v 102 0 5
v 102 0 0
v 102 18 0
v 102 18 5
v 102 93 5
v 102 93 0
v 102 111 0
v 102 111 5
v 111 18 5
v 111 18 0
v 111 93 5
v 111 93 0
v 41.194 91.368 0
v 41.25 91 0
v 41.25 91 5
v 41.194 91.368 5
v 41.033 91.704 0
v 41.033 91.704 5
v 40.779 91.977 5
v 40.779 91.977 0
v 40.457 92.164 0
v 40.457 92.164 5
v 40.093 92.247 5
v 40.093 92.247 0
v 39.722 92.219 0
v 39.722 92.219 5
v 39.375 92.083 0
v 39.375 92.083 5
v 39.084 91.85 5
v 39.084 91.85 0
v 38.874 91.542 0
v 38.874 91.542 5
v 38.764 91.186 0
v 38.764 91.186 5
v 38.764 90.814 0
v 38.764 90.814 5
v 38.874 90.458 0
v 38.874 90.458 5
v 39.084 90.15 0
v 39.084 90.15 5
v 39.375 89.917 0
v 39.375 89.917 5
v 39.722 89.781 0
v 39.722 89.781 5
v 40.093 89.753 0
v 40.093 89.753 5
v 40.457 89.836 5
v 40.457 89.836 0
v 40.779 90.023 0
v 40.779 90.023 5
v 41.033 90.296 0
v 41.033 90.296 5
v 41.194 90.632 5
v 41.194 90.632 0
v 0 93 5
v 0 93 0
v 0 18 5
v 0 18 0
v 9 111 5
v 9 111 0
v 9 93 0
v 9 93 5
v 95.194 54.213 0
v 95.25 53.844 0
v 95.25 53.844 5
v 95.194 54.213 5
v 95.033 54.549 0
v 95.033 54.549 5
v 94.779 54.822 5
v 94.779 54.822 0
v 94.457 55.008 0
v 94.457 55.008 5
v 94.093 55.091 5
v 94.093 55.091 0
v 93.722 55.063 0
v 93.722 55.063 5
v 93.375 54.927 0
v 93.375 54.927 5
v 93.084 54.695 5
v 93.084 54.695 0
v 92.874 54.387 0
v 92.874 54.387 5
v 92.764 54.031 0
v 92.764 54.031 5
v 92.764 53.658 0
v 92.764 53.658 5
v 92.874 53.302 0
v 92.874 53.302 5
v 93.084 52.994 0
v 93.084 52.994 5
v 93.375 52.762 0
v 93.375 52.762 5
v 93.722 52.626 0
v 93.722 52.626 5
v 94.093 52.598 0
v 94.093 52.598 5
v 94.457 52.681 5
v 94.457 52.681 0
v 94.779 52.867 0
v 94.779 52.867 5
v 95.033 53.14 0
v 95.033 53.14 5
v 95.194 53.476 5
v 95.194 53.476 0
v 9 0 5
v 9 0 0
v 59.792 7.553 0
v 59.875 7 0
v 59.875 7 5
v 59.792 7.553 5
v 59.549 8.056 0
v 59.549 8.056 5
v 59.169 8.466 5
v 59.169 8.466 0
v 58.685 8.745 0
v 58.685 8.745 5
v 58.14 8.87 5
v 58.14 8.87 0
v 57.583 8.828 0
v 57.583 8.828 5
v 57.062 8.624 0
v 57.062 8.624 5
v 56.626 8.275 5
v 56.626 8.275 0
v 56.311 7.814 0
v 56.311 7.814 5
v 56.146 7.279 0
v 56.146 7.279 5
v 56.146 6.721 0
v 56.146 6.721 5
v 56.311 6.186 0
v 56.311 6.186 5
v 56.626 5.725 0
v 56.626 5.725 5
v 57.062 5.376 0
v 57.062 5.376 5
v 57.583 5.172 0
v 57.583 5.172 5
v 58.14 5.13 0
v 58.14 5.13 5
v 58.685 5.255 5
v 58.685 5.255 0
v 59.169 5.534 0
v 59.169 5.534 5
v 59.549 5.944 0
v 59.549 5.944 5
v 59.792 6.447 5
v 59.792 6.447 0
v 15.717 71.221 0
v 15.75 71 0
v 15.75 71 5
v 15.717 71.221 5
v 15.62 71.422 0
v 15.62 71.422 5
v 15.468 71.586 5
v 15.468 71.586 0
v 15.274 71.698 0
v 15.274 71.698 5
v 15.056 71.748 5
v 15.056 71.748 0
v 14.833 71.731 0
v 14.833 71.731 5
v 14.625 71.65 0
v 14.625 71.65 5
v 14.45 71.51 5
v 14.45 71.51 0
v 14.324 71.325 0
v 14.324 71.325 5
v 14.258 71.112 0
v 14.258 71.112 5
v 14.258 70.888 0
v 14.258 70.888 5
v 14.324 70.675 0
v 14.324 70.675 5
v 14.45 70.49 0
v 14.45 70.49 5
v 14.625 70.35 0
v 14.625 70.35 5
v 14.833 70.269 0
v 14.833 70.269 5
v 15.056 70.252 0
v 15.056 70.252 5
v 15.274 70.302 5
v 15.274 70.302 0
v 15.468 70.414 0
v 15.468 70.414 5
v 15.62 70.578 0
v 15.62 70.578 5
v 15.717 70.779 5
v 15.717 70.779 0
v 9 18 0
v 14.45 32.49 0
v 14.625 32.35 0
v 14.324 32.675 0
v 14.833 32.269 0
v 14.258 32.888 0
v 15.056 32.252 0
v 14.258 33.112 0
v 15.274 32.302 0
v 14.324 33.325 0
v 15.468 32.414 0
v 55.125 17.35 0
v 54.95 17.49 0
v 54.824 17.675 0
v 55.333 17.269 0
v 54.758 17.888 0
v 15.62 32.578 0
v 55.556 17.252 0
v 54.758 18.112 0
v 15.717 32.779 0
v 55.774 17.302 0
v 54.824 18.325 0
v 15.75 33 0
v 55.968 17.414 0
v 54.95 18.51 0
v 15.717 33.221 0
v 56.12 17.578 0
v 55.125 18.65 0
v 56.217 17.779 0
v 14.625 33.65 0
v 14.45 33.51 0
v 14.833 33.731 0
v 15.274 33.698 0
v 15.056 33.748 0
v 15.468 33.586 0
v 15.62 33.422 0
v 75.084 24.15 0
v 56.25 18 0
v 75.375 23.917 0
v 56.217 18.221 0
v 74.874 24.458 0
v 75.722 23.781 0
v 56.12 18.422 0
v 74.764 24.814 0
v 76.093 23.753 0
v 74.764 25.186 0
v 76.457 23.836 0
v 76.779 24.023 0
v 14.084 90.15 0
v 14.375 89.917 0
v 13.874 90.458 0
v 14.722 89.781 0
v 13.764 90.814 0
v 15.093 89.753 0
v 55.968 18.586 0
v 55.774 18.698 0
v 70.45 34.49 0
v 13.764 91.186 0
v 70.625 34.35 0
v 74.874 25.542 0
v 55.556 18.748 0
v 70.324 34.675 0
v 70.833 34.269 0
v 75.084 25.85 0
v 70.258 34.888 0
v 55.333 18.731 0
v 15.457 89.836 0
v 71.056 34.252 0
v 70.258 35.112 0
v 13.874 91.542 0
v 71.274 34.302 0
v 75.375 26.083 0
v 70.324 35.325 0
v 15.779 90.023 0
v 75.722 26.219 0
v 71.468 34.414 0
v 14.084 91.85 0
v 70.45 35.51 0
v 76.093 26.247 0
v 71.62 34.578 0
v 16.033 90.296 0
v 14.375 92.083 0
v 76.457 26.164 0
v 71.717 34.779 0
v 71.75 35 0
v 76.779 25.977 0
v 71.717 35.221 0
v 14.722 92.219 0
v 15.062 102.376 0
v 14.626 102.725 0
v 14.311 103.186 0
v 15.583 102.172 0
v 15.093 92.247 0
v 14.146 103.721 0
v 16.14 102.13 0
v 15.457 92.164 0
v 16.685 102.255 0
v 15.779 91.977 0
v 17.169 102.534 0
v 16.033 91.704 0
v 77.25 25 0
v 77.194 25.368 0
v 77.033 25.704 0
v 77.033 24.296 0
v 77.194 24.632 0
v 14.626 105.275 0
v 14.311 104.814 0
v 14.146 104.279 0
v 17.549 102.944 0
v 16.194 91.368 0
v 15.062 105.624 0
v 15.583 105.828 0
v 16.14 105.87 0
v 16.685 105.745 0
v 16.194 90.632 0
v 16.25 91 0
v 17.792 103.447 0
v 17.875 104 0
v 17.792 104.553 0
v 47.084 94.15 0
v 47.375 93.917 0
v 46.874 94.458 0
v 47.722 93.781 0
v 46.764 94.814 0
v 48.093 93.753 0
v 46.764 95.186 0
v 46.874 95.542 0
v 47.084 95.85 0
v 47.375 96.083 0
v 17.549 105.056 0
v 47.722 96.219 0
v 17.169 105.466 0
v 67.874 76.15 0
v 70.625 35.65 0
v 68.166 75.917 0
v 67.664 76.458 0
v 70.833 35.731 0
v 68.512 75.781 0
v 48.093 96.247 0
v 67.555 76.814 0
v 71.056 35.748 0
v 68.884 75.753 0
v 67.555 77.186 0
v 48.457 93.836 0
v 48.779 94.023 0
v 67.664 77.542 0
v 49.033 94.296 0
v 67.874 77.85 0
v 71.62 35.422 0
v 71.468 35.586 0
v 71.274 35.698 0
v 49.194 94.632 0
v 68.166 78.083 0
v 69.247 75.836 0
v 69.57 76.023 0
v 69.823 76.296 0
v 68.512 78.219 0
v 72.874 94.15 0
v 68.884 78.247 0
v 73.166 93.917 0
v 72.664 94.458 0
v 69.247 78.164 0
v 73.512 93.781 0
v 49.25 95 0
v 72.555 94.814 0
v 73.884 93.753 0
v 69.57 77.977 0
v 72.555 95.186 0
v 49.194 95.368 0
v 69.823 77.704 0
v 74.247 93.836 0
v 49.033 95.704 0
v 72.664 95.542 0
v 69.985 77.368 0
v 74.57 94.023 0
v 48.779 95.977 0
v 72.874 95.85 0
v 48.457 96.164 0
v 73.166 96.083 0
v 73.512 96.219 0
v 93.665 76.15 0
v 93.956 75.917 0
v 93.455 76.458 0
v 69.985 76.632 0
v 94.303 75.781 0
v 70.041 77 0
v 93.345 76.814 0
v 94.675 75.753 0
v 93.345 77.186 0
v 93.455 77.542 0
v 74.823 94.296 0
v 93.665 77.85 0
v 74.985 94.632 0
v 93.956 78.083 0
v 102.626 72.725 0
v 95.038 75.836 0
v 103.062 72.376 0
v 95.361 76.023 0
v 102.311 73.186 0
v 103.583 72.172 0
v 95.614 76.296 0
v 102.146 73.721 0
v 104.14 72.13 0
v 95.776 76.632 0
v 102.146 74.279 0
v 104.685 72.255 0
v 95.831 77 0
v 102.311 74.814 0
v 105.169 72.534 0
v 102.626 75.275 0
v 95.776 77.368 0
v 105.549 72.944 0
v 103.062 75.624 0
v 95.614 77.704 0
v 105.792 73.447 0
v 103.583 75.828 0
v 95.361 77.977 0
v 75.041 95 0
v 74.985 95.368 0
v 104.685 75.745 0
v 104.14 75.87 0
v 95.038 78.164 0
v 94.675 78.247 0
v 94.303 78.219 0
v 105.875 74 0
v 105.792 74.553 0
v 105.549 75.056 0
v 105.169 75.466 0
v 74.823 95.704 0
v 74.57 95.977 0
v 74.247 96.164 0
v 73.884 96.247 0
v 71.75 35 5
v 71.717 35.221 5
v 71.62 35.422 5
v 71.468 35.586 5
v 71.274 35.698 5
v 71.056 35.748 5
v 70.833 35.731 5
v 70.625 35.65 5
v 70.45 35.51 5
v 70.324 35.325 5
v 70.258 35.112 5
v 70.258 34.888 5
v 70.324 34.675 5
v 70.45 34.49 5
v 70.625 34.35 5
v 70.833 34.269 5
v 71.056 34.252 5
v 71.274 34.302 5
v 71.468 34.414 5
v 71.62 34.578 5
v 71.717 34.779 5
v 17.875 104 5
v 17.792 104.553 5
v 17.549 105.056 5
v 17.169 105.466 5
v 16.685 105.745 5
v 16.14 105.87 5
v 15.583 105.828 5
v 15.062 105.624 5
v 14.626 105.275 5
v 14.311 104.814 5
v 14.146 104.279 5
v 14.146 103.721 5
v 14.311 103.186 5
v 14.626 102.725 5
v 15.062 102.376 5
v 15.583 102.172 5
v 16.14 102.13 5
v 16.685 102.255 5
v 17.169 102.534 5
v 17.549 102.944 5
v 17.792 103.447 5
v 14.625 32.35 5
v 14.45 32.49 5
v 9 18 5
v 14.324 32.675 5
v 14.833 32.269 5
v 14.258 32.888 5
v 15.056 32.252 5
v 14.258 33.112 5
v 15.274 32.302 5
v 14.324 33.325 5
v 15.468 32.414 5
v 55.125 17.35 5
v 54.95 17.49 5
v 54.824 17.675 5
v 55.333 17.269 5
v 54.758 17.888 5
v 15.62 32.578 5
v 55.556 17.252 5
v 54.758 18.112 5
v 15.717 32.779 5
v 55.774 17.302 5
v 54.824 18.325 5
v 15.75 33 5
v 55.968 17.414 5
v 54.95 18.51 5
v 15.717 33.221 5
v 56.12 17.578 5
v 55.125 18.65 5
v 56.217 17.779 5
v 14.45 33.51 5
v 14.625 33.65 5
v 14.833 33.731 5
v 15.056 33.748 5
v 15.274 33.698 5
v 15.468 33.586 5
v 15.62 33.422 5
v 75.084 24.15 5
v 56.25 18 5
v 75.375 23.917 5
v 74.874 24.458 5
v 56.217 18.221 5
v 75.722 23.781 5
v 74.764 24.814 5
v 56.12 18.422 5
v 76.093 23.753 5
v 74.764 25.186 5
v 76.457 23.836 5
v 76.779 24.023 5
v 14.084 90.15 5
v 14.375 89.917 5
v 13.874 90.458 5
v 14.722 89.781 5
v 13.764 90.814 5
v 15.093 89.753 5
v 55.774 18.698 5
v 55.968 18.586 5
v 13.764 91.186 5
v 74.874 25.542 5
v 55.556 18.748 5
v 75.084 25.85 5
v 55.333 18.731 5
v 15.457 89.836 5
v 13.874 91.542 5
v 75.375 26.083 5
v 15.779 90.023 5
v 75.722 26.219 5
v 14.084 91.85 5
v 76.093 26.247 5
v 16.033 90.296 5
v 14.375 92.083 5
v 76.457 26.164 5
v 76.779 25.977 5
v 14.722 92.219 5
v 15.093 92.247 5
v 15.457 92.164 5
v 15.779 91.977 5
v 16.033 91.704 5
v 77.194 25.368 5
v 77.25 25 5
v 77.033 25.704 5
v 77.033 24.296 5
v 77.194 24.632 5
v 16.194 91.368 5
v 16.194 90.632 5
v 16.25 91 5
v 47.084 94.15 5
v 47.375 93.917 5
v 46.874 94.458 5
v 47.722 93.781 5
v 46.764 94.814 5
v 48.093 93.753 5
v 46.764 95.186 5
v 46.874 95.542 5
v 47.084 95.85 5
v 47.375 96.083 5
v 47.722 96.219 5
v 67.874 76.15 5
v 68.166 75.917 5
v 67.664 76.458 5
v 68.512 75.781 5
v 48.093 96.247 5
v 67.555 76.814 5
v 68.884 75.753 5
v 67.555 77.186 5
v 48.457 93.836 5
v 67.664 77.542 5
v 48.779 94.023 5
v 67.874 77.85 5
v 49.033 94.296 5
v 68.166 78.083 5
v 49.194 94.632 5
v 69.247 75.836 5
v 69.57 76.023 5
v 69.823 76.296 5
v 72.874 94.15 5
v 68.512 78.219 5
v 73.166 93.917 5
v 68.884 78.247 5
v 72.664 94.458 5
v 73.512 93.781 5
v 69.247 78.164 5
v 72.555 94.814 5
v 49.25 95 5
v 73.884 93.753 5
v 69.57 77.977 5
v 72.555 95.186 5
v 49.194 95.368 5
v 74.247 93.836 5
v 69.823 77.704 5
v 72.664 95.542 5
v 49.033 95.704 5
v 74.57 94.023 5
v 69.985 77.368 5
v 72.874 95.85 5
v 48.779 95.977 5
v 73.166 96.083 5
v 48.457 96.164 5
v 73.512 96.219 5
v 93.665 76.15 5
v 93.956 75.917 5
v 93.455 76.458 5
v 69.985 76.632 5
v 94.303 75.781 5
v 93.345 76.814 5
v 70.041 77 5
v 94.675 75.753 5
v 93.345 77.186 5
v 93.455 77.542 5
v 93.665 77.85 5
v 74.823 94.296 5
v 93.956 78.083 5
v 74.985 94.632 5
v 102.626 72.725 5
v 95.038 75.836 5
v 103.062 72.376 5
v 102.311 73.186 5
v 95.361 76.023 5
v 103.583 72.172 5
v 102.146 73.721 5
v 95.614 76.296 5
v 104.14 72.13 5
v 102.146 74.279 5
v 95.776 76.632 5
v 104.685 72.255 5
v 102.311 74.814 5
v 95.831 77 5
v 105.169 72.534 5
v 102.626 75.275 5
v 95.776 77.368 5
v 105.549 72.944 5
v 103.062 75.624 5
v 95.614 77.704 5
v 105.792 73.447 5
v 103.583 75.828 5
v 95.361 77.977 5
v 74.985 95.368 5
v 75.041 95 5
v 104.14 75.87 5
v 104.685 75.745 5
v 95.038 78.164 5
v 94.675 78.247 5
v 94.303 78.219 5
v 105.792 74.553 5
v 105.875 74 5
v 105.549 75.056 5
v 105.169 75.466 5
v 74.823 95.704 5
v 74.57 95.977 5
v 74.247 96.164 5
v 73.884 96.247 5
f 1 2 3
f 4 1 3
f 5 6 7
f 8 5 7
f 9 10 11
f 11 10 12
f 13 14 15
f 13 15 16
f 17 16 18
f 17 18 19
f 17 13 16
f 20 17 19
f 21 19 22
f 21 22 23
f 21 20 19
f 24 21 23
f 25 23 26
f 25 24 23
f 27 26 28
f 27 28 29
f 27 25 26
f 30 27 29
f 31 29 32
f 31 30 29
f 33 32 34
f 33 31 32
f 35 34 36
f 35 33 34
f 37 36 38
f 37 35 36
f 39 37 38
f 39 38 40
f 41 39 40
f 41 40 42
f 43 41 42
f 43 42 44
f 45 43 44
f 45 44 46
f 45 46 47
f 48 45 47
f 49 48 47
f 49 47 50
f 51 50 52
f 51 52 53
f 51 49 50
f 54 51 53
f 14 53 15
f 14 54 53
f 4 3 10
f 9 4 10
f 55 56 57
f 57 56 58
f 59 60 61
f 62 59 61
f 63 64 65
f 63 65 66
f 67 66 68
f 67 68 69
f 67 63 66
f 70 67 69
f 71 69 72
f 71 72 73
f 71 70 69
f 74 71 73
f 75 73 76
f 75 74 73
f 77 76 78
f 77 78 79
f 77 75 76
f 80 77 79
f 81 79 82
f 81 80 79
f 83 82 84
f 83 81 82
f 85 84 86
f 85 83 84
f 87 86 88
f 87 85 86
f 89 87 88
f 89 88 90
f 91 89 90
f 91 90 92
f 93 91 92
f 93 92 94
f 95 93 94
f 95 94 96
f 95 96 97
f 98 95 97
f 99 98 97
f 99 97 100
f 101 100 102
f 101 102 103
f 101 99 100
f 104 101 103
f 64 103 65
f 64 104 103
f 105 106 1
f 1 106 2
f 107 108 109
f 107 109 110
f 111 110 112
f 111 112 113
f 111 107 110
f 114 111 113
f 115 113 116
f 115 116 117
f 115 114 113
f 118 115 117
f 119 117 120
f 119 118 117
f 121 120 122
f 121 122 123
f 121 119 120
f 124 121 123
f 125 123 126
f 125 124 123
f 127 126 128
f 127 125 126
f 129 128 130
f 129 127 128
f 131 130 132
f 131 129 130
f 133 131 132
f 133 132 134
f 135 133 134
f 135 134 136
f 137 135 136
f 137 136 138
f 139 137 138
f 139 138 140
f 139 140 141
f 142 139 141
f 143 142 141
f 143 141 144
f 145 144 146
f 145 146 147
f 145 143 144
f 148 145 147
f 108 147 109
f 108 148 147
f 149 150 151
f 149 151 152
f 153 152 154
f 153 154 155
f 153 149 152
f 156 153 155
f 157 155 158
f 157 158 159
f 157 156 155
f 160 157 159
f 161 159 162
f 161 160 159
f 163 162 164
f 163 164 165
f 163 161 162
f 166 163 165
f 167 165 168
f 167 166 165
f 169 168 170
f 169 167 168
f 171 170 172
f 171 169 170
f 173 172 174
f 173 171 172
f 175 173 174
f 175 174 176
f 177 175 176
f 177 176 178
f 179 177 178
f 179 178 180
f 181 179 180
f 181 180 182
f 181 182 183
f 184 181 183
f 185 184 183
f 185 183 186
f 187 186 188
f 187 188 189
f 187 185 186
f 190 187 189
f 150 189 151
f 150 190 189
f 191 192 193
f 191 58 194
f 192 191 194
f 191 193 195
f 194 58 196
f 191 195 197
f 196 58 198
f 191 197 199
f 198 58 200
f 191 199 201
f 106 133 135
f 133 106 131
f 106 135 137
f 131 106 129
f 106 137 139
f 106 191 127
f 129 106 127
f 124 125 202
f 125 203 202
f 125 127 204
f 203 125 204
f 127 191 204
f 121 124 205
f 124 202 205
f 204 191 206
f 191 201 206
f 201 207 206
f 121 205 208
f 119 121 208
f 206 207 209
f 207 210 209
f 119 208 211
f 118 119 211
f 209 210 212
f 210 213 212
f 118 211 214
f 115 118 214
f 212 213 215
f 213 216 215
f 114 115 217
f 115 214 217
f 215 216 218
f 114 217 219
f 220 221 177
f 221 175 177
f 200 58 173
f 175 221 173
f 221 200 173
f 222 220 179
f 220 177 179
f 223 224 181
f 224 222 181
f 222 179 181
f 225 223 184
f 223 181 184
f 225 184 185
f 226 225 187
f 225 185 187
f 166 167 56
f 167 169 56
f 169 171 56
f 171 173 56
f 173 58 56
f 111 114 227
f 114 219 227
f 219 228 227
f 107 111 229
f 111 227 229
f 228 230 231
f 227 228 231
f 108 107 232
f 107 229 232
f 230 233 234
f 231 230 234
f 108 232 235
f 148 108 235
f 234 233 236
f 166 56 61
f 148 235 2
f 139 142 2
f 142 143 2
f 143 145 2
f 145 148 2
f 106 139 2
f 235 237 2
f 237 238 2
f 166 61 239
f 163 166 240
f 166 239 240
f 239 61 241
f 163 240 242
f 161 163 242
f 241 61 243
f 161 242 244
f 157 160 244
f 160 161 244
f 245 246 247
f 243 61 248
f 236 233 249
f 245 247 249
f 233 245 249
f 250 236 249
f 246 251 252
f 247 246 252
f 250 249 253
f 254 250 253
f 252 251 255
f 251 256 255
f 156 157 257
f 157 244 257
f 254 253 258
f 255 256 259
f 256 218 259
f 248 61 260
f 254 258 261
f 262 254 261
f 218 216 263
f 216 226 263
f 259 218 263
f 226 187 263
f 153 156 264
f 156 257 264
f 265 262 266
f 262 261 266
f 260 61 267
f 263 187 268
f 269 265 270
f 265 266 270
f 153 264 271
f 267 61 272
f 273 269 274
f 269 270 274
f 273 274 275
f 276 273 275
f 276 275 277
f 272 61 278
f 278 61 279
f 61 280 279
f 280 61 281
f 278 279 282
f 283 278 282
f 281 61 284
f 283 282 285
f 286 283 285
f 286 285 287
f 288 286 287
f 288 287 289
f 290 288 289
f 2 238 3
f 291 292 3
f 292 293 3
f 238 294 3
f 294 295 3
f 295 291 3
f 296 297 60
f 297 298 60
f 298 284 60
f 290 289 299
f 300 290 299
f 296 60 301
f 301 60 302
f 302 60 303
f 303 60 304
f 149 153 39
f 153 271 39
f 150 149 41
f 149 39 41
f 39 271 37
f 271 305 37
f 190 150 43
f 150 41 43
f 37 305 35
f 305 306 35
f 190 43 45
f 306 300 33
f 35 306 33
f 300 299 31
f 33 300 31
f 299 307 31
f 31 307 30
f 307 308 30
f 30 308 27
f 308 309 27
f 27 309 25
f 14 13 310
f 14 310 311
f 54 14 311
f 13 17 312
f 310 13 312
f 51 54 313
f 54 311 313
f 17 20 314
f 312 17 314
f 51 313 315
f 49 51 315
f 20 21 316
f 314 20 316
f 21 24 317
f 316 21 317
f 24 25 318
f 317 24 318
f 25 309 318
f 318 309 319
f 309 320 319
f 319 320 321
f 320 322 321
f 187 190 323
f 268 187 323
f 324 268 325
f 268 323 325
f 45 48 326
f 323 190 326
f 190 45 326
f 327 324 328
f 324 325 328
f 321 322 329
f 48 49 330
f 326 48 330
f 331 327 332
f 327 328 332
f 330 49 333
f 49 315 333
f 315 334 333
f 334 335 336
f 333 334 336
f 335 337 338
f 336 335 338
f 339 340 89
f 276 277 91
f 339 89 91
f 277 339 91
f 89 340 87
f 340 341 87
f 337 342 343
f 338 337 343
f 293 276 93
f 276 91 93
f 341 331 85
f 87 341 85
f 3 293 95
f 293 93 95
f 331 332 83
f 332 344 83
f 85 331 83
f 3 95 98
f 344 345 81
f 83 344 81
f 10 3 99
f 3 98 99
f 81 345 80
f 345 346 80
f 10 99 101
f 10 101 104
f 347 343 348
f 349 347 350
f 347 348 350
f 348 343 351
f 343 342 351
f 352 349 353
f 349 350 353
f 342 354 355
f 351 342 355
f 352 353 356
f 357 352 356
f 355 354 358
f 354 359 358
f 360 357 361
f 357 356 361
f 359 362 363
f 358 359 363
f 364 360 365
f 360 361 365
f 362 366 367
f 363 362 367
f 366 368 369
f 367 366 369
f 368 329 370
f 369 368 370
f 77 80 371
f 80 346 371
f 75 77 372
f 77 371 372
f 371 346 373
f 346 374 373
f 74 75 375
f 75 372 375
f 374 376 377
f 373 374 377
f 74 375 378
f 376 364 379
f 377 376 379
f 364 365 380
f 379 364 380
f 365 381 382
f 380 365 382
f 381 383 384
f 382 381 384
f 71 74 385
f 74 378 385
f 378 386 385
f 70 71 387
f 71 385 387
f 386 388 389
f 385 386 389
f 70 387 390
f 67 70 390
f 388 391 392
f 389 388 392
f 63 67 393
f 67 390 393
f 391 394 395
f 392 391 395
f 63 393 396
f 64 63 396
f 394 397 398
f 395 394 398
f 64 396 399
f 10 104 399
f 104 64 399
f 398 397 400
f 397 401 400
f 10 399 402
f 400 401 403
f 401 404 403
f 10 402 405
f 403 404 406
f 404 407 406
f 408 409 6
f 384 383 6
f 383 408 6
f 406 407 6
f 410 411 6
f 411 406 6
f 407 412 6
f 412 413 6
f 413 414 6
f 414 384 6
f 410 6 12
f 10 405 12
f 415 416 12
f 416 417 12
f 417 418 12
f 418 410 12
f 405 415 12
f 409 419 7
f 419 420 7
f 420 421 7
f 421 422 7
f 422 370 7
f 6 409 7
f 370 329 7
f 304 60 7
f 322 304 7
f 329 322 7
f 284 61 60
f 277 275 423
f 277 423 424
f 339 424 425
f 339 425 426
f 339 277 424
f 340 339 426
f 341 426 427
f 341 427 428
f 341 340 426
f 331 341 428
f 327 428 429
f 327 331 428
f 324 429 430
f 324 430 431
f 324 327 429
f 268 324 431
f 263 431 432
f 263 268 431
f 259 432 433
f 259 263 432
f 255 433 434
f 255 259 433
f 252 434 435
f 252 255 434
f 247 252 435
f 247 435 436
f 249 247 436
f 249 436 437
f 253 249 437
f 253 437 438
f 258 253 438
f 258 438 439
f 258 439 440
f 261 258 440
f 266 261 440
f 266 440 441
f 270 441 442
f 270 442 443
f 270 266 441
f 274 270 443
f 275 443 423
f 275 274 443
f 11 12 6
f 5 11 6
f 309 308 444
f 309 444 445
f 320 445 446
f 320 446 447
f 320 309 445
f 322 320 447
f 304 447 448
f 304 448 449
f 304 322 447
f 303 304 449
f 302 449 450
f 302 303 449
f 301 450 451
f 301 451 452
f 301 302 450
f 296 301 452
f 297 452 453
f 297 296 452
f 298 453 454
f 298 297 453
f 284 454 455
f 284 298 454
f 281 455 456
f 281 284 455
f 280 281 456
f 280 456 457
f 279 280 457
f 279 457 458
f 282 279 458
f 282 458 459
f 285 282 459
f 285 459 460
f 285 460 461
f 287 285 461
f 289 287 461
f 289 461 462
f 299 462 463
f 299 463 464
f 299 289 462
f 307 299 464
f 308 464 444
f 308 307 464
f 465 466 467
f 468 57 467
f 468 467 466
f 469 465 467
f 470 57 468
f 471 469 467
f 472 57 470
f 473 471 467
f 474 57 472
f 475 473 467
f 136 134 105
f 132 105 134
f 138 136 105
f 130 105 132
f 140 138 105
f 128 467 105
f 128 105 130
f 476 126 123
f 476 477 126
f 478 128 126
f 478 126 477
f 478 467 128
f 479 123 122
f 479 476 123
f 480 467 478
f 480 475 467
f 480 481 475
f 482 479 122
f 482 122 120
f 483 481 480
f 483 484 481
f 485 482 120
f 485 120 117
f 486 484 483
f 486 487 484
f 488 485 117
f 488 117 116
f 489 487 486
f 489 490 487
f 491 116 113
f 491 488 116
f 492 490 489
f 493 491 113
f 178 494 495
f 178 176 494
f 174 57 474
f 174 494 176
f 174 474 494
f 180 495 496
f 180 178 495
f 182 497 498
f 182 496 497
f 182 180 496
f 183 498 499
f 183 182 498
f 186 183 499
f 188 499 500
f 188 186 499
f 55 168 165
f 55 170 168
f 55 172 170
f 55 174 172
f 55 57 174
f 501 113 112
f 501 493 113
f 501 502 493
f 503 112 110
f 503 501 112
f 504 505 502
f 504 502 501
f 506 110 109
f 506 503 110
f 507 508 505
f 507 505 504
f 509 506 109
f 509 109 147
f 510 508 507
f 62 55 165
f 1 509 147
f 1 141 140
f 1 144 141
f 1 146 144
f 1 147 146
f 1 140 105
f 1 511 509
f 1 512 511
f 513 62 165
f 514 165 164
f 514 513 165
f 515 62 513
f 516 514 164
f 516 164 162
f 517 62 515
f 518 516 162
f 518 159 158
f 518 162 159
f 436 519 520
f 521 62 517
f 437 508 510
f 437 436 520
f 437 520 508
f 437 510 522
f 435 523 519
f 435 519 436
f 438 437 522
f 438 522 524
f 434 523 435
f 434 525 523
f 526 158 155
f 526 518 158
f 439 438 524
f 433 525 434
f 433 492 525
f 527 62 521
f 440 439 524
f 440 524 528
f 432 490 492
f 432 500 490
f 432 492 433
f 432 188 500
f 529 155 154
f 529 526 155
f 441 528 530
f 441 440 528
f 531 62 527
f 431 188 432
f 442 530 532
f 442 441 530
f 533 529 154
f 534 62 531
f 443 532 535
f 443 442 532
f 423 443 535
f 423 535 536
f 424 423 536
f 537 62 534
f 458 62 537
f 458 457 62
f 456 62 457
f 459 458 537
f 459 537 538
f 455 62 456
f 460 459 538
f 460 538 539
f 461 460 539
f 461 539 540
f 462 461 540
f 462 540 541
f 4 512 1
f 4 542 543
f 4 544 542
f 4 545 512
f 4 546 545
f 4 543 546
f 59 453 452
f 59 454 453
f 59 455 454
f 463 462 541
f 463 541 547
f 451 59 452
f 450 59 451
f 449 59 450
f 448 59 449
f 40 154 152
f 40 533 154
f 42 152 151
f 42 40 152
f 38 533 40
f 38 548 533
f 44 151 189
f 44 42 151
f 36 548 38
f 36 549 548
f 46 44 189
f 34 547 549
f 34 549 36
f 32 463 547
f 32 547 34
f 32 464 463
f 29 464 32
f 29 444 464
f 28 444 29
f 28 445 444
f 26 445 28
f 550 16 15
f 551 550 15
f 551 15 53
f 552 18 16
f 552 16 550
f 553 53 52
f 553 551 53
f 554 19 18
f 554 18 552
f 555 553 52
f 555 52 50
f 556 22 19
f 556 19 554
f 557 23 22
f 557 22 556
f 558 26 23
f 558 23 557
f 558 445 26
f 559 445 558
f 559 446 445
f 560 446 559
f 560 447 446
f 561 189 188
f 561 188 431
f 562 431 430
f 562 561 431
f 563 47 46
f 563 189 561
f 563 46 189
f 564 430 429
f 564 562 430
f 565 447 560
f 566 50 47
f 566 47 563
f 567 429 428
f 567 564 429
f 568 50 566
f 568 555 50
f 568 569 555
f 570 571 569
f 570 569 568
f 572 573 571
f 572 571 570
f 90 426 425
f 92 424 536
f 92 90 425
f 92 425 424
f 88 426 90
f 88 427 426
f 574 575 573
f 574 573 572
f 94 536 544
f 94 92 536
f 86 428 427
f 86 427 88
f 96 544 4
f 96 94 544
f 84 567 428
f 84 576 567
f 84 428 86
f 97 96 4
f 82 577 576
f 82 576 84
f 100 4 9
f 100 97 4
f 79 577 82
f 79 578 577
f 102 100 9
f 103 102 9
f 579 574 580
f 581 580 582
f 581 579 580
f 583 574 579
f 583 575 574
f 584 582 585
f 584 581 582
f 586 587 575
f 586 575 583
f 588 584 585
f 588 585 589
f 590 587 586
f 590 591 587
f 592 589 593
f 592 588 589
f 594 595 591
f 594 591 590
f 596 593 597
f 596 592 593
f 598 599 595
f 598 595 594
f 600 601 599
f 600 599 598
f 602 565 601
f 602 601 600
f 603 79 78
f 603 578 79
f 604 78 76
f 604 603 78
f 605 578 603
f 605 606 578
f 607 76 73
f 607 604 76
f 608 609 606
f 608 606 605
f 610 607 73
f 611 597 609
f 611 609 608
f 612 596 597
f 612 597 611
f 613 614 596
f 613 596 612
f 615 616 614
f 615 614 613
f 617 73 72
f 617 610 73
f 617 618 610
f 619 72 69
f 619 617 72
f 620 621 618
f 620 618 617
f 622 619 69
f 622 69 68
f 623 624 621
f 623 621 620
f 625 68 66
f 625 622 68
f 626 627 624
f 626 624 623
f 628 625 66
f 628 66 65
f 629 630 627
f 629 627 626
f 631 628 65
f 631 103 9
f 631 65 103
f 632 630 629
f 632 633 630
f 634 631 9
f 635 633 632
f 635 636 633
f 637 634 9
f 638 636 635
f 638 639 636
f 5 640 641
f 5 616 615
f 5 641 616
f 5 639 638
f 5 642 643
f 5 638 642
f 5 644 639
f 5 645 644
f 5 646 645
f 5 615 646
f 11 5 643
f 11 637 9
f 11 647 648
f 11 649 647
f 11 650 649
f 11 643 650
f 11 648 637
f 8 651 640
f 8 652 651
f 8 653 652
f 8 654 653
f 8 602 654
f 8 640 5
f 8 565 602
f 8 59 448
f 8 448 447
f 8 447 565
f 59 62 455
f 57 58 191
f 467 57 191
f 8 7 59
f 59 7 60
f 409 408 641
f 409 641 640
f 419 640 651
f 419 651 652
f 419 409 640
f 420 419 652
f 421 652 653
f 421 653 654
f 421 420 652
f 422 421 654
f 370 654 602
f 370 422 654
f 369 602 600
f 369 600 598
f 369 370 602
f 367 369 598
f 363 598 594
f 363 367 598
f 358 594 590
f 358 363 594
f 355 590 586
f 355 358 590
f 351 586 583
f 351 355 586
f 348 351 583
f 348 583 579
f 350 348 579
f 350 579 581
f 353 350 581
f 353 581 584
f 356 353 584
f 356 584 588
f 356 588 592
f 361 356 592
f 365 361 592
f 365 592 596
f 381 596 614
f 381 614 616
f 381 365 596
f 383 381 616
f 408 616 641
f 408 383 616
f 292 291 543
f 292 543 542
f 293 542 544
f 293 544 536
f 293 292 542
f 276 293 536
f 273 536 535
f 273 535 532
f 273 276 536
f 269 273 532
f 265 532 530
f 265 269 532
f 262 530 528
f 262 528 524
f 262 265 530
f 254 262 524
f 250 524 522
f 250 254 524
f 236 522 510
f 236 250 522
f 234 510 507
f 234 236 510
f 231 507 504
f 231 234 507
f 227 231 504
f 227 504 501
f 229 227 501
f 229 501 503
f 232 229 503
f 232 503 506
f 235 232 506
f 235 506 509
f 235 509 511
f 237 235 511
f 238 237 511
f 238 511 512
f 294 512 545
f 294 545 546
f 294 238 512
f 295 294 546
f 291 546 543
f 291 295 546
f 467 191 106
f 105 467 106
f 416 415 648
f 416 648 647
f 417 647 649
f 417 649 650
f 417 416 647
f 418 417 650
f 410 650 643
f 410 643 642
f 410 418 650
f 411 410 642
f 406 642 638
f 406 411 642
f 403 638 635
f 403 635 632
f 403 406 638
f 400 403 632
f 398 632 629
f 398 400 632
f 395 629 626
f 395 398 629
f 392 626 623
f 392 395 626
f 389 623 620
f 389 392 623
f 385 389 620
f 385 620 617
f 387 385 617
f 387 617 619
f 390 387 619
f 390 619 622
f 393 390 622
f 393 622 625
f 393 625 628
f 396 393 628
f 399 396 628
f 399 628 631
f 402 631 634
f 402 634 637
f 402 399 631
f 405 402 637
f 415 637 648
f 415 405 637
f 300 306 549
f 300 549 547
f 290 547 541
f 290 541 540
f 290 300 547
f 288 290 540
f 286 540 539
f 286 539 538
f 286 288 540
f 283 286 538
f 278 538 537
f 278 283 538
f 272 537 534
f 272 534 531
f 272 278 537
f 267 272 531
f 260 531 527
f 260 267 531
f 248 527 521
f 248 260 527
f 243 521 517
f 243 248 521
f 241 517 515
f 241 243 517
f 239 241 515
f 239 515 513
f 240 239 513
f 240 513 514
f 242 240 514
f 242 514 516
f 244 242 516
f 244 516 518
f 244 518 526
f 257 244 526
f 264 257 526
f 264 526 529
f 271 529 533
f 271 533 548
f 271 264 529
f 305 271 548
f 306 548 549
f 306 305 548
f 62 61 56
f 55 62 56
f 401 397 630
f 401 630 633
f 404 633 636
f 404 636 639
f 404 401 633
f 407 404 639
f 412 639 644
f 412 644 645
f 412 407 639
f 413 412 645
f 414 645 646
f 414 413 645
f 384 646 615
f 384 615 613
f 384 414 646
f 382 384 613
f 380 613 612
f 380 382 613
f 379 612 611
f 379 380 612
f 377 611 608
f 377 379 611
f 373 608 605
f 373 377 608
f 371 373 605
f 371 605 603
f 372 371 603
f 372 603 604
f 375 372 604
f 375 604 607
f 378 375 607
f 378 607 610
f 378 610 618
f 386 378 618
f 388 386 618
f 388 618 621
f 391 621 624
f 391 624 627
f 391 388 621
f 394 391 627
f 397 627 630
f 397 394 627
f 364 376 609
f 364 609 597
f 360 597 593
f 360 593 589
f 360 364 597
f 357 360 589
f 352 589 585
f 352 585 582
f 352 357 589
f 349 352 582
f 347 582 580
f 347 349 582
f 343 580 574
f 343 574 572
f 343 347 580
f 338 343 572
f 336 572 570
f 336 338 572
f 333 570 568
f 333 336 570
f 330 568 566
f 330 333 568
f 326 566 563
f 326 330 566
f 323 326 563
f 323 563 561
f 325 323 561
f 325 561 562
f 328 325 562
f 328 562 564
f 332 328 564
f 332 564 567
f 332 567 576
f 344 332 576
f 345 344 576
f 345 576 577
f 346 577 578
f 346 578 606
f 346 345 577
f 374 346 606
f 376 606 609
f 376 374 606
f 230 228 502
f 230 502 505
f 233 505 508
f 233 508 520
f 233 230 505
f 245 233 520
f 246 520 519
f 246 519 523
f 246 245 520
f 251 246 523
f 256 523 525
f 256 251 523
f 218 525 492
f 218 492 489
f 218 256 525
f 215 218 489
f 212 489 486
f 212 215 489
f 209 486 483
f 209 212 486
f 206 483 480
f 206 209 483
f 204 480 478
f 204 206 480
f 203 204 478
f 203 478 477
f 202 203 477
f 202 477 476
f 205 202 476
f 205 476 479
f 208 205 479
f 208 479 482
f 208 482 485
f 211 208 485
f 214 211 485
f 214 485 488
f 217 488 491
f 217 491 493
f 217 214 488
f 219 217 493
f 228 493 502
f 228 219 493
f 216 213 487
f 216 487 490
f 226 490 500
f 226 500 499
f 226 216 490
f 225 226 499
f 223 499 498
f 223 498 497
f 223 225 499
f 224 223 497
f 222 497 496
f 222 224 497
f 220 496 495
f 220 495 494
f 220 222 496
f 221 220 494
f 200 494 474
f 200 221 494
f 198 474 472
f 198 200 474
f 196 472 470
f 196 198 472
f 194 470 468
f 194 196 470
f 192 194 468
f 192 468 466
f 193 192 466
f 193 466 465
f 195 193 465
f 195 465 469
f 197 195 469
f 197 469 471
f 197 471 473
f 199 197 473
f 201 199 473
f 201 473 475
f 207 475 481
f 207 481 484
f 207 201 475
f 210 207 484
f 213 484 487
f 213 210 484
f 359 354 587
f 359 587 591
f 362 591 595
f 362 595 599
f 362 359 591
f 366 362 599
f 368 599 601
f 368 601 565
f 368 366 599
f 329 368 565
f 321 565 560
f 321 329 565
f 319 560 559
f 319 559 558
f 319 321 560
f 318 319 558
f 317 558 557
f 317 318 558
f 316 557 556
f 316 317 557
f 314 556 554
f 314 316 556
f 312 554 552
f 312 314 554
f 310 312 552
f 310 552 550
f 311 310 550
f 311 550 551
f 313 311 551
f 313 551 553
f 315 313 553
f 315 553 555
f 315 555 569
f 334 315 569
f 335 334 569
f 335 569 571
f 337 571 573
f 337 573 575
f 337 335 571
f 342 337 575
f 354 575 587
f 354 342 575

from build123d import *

# Parameters (mm, degrees)
SZKIC2_R                    = 0.75
SZKIC2_R_2                  = 1.875
SZKIC2_R_3                  = 1.25
DODANIE_WYCI_GNI_CIE1_DEPTH = 5


with BuildPart() as part:
    # Szkic2 → Dodanie-wyciągnięcie1 (new body)
    with BuildSketch(Plane.XY):
        Polygon((9, 18), (9, 0), (102, 0), (102, 18), (111, 18), (111, 93), (102, 93), (102, 111), (9, 111), (9, 93), (0, 93), (0, 18), align=None)
        with Locations((15, 33)):
            Circle(SZKIC2_R, mode=Mode.SUBTRACT)
        with Locations((58, 7)):
            Circle(SZKIC2_R_2, mode=Mode.SUBTRACT)
        with Locations((55.5, 18)):
            Circle(SZKIC2_R, mode=Mode.SUBTRACT)
        with Locations((76, 25)):
            Circle(SZKIC2_R_3, mode=Mode.SUBTRACT)
        with Locations((71, 35)):
            Circle(SZKIC2_R, mode=Mode.SUBTRACT)
        with Locations((94, 53.844410204)):
            Circle(SZKIC2_R_3, mode=Mode.SUBTRACT)
        with Locations((15, 71)):
            Circle(SZKIC2_R, mode=Mode.SUBTRACT)
        with Locations((15, 91)):
            Circle(SZKIC2_R_3, mode=Mode.SUBTRACT)
        with Locations((16, 104)):
            Circle(SZKIC2_R_2, mode=Mode.SUBTRACT)
        with Locations((40, 91)):
            Circle(SZKIC2_R_3, mode=Mode.SUBTRACT)
        with Locations((48, 95)):
            Circle(SZKIC2_R_3, mode=Mode.SUBTRACT)
        with Locations((68.790622886, 77)):
            Circle(SZKIC2_R_3, mode=Mode.SUBTRACT)
        with Locations((94.581245773, 77)):
            Circle(SZKIC2_R_3, mode=Mode.SUBTRACT)
        with Locations((104, 74)):
            Circle(SZKIC2_R_2, mode=Mode.SUBTRACT)
        with Locations((73.790622886, 95)):
            Circle(SZKIC2_R_3, mode=Mode.SUBTRACT)
    extrude(amount=DODANIE_WYCI_GNI_CIE1_DEPTH)


solid = part.part
